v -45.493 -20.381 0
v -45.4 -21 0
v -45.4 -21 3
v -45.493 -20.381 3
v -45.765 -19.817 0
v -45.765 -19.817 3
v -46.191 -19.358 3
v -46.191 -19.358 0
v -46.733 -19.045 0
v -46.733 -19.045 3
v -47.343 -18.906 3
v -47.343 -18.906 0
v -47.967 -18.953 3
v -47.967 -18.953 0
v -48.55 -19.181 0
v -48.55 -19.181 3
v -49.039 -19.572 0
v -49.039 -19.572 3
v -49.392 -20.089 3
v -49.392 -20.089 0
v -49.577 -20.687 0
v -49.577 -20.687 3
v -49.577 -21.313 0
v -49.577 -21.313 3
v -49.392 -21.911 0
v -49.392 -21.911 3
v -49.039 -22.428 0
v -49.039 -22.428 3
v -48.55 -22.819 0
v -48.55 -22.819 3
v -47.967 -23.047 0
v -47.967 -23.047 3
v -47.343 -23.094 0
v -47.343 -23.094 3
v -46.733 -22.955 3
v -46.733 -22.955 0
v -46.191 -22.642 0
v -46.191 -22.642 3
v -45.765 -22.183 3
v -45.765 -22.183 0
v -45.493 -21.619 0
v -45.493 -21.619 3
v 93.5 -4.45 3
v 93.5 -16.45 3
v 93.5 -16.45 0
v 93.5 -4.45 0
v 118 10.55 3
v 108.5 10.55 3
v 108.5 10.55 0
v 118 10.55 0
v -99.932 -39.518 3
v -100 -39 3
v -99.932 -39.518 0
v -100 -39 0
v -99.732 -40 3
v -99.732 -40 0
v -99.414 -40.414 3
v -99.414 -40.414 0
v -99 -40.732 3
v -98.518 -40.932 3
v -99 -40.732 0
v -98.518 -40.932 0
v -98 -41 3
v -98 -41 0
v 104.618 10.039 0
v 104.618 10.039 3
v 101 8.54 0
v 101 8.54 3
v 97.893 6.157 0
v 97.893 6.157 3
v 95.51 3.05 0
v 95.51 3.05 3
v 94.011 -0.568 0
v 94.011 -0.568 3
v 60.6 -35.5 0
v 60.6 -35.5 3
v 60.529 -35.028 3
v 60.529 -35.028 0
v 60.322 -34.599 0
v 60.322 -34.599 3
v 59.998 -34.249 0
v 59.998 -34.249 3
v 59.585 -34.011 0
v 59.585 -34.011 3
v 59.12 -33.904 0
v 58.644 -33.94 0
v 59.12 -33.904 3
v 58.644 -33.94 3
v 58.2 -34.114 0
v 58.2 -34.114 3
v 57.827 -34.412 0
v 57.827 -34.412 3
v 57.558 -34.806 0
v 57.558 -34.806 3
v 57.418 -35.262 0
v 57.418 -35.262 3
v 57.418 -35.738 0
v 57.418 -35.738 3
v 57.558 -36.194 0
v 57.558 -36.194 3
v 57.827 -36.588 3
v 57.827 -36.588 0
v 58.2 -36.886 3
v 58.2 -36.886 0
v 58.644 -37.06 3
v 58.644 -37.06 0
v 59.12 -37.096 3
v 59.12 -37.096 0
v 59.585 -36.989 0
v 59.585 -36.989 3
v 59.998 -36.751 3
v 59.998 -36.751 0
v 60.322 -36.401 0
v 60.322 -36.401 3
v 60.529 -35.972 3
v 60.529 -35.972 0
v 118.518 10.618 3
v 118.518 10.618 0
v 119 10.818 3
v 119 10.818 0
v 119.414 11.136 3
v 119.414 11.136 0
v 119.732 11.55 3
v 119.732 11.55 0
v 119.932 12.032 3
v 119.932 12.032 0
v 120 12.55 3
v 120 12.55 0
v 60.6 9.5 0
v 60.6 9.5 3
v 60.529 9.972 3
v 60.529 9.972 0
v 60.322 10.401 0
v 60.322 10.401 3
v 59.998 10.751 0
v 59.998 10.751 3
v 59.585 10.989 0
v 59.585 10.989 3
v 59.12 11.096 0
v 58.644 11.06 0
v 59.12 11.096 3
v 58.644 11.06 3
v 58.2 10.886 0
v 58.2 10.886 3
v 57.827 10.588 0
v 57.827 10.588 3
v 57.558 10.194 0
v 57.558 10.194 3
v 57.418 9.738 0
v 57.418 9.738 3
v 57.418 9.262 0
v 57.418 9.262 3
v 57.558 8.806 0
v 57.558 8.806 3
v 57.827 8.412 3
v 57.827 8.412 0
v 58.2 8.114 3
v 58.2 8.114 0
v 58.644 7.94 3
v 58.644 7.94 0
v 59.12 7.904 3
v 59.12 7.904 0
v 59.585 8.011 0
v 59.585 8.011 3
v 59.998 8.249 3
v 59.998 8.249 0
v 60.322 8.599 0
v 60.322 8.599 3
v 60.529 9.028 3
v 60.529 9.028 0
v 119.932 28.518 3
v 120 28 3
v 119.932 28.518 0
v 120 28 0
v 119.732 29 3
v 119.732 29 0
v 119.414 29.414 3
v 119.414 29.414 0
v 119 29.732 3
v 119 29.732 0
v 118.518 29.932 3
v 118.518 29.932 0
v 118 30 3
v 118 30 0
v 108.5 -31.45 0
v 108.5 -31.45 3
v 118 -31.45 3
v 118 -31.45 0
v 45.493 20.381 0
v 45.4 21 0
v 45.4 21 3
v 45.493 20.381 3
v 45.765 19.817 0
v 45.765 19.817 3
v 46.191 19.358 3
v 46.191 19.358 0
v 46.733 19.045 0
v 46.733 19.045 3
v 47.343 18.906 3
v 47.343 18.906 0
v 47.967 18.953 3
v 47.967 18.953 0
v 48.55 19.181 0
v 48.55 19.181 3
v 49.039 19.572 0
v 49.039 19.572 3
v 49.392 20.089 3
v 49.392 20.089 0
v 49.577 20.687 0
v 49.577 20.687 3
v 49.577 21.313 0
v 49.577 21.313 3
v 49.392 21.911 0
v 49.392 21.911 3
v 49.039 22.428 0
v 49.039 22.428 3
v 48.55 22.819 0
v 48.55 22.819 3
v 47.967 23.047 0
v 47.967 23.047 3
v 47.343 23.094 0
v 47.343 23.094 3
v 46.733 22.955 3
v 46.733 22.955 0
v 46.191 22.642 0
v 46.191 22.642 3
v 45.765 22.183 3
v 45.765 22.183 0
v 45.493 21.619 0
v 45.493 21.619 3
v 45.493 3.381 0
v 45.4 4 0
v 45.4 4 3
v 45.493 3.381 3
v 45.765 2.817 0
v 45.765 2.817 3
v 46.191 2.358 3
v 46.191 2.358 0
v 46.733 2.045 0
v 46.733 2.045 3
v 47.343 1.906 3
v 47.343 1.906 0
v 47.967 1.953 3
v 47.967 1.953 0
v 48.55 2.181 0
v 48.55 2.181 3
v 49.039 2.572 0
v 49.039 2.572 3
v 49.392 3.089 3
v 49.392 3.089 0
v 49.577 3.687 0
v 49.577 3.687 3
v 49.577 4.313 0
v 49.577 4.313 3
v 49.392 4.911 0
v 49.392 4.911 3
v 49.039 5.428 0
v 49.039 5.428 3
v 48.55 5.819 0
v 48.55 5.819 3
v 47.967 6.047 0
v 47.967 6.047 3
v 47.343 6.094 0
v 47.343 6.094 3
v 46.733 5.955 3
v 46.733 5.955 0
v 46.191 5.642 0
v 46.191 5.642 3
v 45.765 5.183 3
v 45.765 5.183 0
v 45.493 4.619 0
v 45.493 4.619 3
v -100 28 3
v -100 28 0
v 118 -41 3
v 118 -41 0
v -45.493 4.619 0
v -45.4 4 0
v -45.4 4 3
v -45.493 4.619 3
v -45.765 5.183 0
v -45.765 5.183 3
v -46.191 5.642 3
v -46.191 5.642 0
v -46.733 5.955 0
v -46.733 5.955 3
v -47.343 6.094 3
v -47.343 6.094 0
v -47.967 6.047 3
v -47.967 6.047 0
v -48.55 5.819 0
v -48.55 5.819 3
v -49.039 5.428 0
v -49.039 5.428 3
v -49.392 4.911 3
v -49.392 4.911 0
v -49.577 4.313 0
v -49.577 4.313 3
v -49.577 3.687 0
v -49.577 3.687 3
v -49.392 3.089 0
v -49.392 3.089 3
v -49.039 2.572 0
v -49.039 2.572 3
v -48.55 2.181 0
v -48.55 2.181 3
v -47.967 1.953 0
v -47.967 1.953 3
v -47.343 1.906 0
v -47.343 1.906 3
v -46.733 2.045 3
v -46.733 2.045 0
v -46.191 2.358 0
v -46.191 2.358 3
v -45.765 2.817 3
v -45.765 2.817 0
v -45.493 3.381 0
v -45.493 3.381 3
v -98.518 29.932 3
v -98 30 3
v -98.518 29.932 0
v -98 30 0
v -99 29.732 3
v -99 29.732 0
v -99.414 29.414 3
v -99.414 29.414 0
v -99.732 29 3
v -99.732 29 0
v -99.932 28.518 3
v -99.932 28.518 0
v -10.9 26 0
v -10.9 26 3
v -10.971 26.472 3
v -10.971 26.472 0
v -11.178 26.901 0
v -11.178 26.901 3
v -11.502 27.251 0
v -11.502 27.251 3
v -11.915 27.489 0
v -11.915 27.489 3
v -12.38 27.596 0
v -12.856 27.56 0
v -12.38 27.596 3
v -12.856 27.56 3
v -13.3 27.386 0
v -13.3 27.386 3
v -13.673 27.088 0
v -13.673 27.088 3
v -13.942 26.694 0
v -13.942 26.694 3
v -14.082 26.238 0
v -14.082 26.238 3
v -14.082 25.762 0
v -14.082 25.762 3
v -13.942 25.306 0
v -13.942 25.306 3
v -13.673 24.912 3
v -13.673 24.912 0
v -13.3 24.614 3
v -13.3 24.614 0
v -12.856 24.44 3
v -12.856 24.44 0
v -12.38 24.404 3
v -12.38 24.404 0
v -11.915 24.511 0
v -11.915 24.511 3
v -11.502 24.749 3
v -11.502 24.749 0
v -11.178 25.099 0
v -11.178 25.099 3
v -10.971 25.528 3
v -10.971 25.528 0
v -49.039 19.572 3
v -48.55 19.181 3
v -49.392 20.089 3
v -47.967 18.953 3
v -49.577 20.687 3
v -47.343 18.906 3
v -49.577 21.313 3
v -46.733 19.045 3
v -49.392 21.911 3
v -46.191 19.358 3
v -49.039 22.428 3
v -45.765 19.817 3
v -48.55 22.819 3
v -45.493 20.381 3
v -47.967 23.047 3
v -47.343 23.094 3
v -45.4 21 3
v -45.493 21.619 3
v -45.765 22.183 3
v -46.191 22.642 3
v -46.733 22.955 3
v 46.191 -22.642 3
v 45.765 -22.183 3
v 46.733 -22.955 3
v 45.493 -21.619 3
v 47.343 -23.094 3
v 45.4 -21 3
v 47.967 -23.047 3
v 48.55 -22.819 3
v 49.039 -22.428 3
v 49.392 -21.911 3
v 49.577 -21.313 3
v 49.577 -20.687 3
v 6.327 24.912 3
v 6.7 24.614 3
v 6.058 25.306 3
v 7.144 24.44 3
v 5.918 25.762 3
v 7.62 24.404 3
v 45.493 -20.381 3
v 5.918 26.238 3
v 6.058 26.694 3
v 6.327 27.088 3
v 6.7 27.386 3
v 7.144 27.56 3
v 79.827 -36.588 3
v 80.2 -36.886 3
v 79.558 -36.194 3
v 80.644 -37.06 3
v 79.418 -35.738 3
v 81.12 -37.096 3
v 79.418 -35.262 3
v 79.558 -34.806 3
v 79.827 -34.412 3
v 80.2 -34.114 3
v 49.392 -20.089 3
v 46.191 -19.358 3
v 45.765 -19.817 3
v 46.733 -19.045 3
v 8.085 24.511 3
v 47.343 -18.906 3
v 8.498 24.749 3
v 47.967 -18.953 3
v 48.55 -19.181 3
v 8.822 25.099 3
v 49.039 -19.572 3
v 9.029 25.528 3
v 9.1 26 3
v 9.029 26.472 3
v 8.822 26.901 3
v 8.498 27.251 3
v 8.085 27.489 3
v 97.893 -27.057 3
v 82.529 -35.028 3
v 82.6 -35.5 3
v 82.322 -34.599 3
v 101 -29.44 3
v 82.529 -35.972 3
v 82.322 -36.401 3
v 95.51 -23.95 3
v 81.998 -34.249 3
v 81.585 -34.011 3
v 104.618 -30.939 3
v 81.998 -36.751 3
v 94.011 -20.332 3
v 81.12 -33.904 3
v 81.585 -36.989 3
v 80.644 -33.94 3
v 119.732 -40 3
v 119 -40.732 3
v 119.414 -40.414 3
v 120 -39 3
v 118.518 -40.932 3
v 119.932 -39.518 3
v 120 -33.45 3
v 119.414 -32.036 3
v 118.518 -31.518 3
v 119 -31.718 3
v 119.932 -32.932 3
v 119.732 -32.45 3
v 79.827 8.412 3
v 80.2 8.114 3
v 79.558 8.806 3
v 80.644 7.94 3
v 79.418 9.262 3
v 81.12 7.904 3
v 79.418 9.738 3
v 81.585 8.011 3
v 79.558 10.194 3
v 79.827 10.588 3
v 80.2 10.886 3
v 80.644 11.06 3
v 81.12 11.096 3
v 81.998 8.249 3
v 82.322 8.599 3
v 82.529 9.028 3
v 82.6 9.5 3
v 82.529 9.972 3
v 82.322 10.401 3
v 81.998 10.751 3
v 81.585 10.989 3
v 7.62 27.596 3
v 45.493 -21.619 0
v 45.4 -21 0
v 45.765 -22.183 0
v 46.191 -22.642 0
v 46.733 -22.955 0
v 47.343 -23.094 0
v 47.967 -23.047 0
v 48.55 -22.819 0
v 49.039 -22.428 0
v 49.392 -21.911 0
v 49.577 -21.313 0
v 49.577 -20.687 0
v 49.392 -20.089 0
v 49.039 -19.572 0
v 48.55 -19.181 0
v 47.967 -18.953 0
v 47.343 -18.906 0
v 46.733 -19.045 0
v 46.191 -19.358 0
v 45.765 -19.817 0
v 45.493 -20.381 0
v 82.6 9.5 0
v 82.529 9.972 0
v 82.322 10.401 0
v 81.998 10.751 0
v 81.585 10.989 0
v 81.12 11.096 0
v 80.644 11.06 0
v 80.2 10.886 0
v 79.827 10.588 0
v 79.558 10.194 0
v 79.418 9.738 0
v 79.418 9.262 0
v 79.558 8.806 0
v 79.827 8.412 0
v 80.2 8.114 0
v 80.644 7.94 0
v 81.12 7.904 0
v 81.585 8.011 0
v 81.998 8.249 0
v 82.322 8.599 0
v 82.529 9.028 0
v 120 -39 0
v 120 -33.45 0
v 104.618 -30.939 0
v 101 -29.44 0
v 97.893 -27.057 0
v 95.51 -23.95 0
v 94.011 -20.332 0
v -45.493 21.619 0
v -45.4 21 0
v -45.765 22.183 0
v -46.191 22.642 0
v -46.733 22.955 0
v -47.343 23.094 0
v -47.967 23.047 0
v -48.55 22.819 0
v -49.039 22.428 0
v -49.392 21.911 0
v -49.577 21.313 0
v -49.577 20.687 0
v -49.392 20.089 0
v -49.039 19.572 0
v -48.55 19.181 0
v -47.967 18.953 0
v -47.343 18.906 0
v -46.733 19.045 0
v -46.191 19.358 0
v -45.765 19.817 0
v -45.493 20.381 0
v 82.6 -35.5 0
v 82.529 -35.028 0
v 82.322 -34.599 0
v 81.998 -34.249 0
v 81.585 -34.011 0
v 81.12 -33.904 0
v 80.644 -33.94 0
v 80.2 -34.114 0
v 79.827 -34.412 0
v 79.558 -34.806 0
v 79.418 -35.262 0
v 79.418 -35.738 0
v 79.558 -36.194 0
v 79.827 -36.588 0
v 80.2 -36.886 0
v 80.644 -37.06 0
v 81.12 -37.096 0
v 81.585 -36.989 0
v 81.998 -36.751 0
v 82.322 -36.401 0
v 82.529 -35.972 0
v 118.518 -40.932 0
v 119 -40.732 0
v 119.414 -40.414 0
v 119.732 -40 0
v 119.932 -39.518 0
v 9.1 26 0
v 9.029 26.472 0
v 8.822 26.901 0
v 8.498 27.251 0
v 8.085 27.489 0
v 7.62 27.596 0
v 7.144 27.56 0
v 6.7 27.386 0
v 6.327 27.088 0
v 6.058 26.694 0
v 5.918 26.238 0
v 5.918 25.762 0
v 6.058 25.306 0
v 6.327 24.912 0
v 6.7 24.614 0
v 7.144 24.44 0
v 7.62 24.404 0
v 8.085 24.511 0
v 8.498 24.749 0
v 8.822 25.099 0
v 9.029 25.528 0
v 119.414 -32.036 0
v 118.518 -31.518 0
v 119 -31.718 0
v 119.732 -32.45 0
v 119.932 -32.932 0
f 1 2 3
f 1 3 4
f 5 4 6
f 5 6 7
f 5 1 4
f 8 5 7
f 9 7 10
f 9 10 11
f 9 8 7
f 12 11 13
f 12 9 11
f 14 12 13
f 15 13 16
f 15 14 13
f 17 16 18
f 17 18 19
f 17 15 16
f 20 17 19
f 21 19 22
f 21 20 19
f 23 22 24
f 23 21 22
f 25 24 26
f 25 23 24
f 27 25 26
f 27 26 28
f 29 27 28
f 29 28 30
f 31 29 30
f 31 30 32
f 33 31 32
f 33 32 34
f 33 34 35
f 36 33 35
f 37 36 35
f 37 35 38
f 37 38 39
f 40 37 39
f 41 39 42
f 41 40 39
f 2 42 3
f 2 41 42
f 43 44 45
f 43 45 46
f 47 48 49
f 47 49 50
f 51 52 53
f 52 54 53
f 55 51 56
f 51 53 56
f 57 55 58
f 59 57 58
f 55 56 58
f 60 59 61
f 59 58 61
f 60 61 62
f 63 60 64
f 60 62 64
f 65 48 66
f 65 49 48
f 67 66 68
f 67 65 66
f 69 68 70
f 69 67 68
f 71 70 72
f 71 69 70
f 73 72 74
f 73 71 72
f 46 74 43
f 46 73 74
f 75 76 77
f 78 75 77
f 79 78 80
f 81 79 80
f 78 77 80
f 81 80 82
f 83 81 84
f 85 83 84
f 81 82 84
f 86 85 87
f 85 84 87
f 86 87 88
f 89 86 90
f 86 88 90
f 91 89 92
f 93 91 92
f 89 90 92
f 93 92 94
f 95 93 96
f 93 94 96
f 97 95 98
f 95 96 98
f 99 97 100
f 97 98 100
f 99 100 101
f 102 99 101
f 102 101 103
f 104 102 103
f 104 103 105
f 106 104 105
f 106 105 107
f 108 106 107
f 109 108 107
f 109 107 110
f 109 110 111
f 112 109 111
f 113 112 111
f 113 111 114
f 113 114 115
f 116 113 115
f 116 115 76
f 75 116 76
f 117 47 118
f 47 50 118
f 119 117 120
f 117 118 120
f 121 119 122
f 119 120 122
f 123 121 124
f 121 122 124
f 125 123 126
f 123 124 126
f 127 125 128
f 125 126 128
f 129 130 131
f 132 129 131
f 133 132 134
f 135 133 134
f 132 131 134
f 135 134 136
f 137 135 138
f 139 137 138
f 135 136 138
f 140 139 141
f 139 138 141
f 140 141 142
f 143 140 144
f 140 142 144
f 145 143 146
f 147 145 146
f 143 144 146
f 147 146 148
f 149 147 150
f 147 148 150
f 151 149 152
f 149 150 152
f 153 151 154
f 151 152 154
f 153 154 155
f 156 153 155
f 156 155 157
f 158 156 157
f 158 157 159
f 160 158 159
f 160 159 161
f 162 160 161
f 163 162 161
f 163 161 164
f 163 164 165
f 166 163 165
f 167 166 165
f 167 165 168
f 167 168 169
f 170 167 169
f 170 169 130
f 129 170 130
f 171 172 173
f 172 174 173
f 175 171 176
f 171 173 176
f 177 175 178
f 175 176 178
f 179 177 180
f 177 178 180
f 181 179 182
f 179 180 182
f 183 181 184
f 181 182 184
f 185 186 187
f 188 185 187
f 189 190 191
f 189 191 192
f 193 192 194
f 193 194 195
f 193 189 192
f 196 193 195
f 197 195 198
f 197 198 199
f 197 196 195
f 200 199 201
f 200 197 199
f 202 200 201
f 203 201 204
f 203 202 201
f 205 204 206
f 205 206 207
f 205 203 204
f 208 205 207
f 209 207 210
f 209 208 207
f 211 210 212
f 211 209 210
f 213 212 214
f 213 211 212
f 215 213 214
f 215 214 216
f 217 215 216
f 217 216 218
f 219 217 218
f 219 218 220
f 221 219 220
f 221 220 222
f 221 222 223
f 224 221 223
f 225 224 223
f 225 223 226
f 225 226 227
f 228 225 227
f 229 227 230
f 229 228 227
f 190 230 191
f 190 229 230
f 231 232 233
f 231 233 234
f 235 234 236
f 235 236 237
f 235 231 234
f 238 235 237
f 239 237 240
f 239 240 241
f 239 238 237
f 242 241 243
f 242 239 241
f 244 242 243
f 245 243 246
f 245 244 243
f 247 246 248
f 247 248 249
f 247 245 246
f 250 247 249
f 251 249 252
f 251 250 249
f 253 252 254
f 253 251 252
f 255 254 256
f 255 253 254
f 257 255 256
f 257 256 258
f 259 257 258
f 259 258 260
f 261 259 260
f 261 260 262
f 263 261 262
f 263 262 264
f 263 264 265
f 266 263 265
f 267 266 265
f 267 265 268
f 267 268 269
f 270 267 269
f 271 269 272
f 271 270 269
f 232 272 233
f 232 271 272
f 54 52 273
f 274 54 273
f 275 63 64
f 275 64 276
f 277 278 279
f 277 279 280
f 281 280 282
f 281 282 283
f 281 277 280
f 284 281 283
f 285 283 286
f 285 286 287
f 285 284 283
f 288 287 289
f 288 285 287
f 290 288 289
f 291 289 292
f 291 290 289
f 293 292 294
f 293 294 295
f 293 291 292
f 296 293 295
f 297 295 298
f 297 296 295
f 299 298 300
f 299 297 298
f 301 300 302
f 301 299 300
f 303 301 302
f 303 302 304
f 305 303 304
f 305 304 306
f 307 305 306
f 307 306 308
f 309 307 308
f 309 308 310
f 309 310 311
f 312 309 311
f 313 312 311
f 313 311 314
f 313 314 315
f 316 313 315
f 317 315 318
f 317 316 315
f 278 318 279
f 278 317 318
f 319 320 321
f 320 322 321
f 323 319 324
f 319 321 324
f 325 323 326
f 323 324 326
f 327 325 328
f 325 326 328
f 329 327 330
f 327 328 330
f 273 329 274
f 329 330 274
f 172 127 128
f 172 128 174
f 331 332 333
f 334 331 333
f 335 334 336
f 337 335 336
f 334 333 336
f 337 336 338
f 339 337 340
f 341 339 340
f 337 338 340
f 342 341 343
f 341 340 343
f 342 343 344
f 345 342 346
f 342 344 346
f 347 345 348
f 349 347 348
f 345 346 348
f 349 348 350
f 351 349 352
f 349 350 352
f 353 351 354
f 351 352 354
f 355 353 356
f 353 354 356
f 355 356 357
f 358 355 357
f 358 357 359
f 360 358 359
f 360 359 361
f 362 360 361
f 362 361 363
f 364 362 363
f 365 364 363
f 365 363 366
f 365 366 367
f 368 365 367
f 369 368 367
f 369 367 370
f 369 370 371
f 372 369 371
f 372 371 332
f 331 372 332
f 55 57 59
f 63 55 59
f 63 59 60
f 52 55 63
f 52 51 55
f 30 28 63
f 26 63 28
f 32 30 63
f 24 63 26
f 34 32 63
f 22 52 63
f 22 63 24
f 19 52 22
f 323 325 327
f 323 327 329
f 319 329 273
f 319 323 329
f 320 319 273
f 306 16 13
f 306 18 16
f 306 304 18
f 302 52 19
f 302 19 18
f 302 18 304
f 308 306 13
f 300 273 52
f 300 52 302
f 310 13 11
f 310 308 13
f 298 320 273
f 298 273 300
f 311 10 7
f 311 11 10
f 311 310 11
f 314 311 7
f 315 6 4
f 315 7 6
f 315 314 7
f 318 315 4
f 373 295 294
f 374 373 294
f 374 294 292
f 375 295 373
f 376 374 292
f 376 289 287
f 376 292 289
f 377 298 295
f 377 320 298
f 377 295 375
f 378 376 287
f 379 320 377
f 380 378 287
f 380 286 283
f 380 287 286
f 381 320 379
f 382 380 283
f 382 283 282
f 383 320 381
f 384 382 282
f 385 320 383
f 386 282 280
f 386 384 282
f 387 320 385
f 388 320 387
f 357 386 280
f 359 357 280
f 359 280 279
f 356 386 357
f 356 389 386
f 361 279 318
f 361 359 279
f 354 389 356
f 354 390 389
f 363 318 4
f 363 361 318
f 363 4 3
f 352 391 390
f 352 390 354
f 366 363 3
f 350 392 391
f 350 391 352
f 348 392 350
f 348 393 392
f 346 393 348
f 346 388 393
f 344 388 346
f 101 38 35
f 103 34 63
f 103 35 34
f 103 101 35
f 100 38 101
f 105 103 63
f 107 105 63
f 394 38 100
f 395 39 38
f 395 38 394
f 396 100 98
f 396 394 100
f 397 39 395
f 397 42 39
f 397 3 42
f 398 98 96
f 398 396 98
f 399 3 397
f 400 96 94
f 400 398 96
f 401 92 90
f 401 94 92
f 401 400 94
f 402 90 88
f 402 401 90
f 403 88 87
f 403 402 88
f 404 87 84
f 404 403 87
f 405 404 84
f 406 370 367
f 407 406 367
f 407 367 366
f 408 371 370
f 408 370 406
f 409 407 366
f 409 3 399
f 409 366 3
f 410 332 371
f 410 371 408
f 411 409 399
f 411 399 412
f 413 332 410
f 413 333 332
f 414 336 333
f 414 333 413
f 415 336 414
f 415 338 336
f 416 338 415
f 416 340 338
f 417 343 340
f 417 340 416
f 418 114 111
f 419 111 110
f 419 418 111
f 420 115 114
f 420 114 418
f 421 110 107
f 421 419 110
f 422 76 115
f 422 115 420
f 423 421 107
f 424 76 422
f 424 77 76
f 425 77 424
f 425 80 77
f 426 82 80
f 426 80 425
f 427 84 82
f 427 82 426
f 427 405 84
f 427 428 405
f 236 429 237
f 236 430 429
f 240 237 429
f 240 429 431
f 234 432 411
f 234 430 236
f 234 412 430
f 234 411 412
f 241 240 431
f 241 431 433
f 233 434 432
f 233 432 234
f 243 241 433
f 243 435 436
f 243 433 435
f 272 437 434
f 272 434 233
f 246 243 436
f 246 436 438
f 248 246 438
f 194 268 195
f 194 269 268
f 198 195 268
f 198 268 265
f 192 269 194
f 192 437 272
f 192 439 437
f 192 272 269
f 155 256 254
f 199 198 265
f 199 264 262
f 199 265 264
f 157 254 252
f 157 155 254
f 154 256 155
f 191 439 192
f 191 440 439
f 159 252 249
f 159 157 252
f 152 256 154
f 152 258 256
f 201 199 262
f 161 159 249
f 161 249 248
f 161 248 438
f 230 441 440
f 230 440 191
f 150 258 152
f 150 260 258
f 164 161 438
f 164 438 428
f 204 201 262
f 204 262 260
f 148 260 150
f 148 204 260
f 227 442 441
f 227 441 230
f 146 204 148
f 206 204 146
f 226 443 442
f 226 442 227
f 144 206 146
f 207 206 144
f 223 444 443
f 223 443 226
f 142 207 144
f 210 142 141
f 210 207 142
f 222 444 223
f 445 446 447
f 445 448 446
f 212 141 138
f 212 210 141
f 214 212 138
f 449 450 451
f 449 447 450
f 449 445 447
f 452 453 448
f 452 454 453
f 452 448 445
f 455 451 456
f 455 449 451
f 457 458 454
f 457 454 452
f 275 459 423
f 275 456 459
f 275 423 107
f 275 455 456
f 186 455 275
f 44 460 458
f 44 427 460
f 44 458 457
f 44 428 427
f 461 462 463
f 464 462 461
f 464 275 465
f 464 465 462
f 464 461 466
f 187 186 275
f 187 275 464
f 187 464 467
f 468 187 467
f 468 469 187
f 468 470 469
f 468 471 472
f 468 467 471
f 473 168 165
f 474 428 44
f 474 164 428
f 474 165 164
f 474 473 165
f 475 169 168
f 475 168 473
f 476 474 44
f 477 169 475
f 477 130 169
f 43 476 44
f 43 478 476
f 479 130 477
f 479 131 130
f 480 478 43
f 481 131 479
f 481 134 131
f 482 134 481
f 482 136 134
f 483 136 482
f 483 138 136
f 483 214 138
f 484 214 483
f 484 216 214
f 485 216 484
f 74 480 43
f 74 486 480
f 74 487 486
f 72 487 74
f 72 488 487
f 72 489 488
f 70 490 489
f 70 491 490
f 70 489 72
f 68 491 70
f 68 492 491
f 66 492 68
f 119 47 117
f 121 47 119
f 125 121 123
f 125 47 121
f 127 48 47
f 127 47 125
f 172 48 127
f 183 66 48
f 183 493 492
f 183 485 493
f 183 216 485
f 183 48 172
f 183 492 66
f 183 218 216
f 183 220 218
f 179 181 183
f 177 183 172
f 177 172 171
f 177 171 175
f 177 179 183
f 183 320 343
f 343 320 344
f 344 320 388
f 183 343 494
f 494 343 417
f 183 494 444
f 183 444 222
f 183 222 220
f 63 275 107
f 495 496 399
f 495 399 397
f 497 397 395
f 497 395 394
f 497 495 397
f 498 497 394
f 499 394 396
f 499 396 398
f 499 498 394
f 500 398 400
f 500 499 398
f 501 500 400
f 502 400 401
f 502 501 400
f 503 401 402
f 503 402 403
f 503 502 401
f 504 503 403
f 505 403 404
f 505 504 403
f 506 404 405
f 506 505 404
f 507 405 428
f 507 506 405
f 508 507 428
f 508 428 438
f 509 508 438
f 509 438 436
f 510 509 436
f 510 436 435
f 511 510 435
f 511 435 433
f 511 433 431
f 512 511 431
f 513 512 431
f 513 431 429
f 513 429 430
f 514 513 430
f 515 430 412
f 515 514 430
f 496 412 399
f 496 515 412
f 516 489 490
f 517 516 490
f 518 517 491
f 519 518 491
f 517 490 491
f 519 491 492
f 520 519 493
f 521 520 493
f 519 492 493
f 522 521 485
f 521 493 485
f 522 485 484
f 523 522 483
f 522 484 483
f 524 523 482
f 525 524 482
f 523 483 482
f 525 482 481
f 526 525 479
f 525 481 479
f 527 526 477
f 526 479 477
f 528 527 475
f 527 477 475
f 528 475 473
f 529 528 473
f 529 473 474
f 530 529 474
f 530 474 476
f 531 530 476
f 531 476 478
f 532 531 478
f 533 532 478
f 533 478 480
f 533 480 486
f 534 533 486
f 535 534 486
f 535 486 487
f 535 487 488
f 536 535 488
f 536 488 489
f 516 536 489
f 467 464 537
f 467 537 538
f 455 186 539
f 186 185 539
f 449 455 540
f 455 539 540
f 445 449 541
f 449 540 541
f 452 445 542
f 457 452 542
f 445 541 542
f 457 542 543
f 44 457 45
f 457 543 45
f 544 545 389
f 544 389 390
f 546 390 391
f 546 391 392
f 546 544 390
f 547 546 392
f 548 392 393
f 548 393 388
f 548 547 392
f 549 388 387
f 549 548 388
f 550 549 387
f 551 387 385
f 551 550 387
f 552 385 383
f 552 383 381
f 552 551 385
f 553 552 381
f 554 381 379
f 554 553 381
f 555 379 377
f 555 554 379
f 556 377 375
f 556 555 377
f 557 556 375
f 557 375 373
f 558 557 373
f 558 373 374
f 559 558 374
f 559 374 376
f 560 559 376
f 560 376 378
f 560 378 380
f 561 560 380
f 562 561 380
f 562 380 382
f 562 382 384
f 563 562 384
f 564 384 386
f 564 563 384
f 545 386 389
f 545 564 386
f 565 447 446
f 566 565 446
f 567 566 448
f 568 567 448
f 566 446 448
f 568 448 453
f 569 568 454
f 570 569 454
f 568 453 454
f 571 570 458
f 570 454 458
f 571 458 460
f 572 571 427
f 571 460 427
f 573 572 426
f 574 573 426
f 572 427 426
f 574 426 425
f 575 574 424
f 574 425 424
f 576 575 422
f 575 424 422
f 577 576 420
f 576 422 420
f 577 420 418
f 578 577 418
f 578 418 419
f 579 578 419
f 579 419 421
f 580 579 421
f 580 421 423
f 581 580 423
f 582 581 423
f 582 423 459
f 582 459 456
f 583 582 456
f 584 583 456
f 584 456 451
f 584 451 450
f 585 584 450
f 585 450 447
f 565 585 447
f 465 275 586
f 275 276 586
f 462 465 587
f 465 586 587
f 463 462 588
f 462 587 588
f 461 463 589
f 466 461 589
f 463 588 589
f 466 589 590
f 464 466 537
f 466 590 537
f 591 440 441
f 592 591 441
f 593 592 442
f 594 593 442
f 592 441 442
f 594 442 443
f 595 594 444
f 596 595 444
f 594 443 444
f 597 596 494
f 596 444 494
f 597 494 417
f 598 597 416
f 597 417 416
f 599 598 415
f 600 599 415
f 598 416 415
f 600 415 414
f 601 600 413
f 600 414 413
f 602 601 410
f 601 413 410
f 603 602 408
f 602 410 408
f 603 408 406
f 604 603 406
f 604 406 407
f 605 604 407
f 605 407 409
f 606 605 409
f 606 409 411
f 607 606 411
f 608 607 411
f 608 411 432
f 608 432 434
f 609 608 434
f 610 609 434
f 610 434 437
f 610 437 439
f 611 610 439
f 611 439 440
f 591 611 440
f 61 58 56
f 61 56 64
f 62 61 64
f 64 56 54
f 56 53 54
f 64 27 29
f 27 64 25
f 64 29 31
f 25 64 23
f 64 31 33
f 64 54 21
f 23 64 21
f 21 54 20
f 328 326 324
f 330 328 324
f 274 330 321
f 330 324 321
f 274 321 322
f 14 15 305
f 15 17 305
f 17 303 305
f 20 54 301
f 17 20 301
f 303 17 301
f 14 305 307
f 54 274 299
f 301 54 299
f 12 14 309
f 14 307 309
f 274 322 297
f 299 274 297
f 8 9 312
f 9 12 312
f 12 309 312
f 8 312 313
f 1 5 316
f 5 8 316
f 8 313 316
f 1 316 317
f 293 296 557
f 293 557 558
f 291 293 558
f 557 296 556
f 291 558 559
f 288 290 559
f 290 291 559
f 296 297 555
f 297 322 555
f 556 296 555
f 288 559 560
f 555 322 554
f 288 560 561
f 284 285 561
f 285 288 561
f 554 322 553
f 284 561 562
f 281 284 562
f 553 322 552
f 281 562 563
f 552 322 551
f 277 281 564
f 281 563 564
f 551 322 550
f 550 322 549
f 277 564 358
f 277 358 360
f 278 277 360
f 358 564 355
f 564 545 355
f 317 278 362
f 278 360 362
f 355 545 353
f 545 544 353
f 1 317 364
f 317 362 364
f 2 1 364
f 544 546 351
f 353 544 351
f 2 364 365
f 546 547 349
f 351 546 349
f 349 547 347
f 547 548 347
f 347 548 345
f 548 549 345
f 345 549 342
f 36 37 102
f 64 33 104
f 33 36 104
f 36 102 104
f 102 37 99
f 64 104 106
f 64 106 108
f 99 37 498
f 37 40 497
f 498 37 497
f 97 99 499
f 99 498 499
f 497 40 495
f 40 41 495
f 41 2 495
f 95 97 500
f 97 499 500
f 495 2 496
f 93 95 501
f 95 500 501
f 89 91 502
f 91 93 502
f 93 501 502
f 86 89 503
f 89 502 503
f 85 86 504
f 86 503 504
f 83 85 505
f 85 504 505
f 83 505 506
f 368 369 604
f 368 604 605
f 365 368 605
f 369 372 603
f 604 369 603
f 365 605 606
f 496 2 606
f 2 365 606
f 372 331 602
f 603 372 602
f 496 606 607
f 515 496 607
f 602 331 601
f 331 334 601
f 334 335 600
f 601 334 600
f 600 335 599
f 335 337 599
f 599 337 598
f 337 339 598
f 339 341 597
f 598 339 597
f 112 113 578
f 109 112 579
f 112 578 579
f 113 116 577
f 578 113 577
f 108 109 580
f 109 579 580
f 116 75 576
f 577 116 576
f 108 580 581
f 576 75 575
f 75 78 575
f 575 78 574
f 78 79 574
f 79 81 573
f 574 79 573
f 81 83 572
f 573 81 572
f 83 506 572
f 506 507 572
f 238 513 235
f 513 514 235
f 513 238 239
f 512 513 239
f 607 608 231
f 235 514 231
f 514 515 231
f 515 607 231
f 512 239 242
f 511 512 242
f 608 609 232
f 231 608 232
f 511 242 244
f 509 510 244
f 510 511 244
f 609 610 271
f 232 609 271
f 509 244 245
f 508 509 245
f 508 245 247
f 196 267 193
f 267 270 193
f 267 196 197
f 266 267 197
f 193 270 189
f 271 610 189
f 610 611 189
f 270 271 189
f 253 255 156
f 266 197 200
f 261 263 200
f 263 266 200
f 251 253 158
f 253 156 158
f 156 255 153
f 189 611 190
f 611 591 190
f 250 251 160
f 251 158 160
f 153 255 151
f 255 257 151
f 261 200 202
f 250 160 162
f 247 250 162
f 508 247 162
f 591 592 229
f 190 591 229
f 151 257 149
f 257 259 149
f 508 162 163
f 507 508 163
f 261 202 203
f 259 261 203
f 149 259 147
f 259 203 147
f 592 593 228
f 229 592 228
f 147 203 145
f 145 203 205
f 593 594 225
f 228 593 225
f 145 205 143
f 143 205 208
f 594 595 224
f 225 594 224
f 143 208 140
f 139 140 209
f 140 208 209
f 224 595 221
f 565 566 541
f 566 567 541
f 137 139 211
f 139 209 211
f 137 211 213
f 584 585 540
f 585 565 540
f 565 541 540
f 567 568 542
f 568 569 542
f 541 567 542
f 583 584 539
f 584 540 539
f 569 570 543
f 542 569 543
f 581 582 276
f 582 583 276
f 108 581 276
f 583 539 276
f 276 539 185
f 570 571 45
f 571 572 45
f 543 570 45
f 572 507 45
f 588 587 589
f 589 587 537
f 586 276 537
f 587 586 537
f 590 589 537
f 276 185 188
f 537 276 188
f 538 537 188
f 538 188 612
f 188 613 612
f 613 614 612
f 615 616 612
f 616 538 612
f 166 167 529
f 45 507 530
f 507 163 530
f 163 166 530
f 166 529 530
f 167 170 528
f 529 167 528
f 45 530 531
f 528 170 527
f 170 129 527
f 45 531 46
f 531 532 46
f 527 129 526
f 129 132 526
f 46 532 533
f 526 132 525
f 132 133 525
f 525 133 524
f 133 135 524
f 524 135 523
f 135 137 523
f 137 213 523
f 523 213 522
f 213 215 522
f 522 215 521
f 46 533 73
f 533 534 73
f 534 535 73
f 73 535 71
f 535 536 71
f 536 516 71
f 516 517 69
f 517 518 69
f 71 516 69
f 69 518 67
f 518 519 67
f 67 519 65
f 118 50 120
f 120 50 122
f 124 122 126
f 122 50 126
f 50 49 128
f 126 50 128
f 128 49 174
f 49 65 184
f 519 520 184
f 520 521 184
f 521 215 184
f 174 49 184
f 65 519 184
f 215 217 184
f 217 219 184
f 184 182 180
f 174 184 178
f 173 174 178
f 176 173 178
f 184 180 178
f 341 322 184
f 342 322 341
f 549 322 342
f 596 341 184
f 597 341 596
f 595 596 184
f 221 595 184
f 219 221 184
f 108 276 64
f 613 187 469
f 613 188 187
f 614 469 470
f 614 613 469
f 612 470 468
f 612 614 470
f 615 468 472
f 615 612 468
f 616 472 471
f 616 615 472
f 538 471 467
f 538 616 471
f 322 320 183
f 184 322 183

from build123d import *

# Parameters (mm, degrees)
SKETCH_1_W          = 200
SKETCH_1_H          = 54
SKETCH_1_R          = 2.1
EXTRUDE_1_DEPTH     = 3
SKETCH_3_W          = 200
SKETCH_3_H          = 14
EXTRUDE_2_DEPTH     = 3
SKETCH_2_R          = 1.6
CUT_EXTRUDE_1_DEPTH = 10
SKETCH_7_W          = 15
SKETCH_7_H          = 68
CUT_EXTRUDE_3_DEPTH = 10
SKETCH_8_W          = 185
SKETCH_8_H          = 3
EXTRUDE_3_DEPTH     = 3
SKETCH_9_R          = 1.6
CUT_EXTRUDE_4_DEPTH = 10
SKETCH_10_W         = 35
SKETCH_10_H         = 71
EXTRUDE_4_DEPTH     = 3
SKETCH_12_W         = 26.5
SKETCH_12_H         = 42
CUT_EXTRUDE_6_DEPTH = 10
FILLET_1_R          = 15
FILLET_2_R          = 2


with BuildPart() as part:
    # 草图1 → 凸台-拉伸1 (new body)
    with BuildSketch(Plane.XY):
        Rectangle(SKETCH_1_W, SKETCH_1_H)
        with Locations((-47.5, 21)):
            Circle(SKETCH_1_R, mode=Mode.SUBTRACT)
        with Locations((-47.5, 4)):
            Circle(SKETCH_1_R, mode=Mode.SUBTRACT)
        with Locations((-47.5, -21)):
            Circle(SKETCH_1_R, mode=Mode.SUBTRACT)
        with Locations(Location((47.5, -21, 0), (0, 0, 180))):
            Circle(SKETCH_1_R, mode=Mode.SUBTRACT)
        with Locations(Location((47.5, 4, 0), (0, 0, 180))):
            Circle(SKETCH_1_R, mode=Mode.SUBTRACT)
        with Locations(Location((47.5, 21, 0), (0, 0, 180))):
            Circle(SKETCH_1_R, mode=Mode.SUBTRACT)
    extrude(amount=EXTRUDE_1_DEPTH)

    # 草图3 → 凸台-拉伸2 (add)
    with BuildSketch(Plane.XY.offset(3)):
        with Locations((0, -34)):
            Rectangle(SKETCH_3_W, SKETCH_3_H)
    extrude(amount=-EXTRUDE_2_DEPTH)

    # 草图2 → 切除-拉伸1 (cut)
    with BuildSketch(Plane.XY.offset(3)):
        with Locations((59, 9.5)):
            Circle(SKETCH_2_R)
        with Locations((81, 9.5)):
            Circle(SKETCH_2_R)
        with Locations((81, -35.5)):
            Circle(SKETCH_2_R)
        with Locations((59, -35.5)):
            Circle(SKETCH_2_R)
    extrude(amount=-CUT_EXTRUDE_1_DEPTH, mode=Mode.SUBTRACT)

    # 草图7 → 切除-拉伸3 (cut)
    with BuildSketch(Plane.XY.offset(3)):
        with Locations((92.5, -7)):
            Rectangle(SKETCH_7_W, SKETCH_7_H)
    extrude(amount=-CUT_EXTRUDE_3_DEPTH, mode=Mode.SUBTRACT)

    # 草图8 → 凸台-拉伸3 (add)
    with BuildSketch(Plane.XY.offset(3)):
        with Locations((-7.5, 28.5)):
            Rectangle(SKETCH_8_W, SKETCH_8_H)
    extrude(amount=-EXTRUDE_3_DEPTH)

    # 草图9 → 切除-拉伸4 (cut)
    with BuildSketch(Plane.XY.offset(3)):
        with Locations((-12.5, 26)):
            Circle(SKETCH_9_R)
        with Locations((7.5, 26)):
            Circle(SKETCH_9_R)
    extrude(amount=-CUT_EXTRUDE_4_DEPTH, mode=Mode.SUBTRACT)

    # 草图10 → 凸台-拉伸4 (add)
    with BuildSketch(Plane.XY.offset(3)):
        with Locations((102.5, -5.5)):
            Rectangle(SKETCH_10_W, SKETCH_10_H)
    extrude(amount=-EXTRUDE_4_DEPTH)

    # 草图12 → 切除-拉伸6 (cut)
    with BuildSketch(Plane.XY.offset(3)):
        with Locations((106.75, -10.45)):
            Rectangle(SKETCH_12_W, SKETCH_12_H)
    extrude(amount=-CUT_EXTRUDE_6_DEPTH, mode=Mode.SUBTRACT)

    # 圆角1
    fillet_1_edges = [part.edges().sort_by_distance(p)[0] for p in [
        (93.5, -31.45, 1.5),
        (93.5, 10.55, 1.5),
    ]]
    fillet(fillet_1_edges, radius=FILLET_1_R)

    # 圆角2
    fillet_2_edges = [part.edges().sort_by_distance(p)[0] for p in [
        (120, 30, 1.5),
        (120, -41, 1.5),
        (120, 10.55, 1.5),
        (120, -31.45, 1.5),
        (-100, -41, 1.5),
        (-100, 30, 1.5),
    ]]
    fillet(fillet_2_edges, radius=FILLET_2_R)


solid = part.part
